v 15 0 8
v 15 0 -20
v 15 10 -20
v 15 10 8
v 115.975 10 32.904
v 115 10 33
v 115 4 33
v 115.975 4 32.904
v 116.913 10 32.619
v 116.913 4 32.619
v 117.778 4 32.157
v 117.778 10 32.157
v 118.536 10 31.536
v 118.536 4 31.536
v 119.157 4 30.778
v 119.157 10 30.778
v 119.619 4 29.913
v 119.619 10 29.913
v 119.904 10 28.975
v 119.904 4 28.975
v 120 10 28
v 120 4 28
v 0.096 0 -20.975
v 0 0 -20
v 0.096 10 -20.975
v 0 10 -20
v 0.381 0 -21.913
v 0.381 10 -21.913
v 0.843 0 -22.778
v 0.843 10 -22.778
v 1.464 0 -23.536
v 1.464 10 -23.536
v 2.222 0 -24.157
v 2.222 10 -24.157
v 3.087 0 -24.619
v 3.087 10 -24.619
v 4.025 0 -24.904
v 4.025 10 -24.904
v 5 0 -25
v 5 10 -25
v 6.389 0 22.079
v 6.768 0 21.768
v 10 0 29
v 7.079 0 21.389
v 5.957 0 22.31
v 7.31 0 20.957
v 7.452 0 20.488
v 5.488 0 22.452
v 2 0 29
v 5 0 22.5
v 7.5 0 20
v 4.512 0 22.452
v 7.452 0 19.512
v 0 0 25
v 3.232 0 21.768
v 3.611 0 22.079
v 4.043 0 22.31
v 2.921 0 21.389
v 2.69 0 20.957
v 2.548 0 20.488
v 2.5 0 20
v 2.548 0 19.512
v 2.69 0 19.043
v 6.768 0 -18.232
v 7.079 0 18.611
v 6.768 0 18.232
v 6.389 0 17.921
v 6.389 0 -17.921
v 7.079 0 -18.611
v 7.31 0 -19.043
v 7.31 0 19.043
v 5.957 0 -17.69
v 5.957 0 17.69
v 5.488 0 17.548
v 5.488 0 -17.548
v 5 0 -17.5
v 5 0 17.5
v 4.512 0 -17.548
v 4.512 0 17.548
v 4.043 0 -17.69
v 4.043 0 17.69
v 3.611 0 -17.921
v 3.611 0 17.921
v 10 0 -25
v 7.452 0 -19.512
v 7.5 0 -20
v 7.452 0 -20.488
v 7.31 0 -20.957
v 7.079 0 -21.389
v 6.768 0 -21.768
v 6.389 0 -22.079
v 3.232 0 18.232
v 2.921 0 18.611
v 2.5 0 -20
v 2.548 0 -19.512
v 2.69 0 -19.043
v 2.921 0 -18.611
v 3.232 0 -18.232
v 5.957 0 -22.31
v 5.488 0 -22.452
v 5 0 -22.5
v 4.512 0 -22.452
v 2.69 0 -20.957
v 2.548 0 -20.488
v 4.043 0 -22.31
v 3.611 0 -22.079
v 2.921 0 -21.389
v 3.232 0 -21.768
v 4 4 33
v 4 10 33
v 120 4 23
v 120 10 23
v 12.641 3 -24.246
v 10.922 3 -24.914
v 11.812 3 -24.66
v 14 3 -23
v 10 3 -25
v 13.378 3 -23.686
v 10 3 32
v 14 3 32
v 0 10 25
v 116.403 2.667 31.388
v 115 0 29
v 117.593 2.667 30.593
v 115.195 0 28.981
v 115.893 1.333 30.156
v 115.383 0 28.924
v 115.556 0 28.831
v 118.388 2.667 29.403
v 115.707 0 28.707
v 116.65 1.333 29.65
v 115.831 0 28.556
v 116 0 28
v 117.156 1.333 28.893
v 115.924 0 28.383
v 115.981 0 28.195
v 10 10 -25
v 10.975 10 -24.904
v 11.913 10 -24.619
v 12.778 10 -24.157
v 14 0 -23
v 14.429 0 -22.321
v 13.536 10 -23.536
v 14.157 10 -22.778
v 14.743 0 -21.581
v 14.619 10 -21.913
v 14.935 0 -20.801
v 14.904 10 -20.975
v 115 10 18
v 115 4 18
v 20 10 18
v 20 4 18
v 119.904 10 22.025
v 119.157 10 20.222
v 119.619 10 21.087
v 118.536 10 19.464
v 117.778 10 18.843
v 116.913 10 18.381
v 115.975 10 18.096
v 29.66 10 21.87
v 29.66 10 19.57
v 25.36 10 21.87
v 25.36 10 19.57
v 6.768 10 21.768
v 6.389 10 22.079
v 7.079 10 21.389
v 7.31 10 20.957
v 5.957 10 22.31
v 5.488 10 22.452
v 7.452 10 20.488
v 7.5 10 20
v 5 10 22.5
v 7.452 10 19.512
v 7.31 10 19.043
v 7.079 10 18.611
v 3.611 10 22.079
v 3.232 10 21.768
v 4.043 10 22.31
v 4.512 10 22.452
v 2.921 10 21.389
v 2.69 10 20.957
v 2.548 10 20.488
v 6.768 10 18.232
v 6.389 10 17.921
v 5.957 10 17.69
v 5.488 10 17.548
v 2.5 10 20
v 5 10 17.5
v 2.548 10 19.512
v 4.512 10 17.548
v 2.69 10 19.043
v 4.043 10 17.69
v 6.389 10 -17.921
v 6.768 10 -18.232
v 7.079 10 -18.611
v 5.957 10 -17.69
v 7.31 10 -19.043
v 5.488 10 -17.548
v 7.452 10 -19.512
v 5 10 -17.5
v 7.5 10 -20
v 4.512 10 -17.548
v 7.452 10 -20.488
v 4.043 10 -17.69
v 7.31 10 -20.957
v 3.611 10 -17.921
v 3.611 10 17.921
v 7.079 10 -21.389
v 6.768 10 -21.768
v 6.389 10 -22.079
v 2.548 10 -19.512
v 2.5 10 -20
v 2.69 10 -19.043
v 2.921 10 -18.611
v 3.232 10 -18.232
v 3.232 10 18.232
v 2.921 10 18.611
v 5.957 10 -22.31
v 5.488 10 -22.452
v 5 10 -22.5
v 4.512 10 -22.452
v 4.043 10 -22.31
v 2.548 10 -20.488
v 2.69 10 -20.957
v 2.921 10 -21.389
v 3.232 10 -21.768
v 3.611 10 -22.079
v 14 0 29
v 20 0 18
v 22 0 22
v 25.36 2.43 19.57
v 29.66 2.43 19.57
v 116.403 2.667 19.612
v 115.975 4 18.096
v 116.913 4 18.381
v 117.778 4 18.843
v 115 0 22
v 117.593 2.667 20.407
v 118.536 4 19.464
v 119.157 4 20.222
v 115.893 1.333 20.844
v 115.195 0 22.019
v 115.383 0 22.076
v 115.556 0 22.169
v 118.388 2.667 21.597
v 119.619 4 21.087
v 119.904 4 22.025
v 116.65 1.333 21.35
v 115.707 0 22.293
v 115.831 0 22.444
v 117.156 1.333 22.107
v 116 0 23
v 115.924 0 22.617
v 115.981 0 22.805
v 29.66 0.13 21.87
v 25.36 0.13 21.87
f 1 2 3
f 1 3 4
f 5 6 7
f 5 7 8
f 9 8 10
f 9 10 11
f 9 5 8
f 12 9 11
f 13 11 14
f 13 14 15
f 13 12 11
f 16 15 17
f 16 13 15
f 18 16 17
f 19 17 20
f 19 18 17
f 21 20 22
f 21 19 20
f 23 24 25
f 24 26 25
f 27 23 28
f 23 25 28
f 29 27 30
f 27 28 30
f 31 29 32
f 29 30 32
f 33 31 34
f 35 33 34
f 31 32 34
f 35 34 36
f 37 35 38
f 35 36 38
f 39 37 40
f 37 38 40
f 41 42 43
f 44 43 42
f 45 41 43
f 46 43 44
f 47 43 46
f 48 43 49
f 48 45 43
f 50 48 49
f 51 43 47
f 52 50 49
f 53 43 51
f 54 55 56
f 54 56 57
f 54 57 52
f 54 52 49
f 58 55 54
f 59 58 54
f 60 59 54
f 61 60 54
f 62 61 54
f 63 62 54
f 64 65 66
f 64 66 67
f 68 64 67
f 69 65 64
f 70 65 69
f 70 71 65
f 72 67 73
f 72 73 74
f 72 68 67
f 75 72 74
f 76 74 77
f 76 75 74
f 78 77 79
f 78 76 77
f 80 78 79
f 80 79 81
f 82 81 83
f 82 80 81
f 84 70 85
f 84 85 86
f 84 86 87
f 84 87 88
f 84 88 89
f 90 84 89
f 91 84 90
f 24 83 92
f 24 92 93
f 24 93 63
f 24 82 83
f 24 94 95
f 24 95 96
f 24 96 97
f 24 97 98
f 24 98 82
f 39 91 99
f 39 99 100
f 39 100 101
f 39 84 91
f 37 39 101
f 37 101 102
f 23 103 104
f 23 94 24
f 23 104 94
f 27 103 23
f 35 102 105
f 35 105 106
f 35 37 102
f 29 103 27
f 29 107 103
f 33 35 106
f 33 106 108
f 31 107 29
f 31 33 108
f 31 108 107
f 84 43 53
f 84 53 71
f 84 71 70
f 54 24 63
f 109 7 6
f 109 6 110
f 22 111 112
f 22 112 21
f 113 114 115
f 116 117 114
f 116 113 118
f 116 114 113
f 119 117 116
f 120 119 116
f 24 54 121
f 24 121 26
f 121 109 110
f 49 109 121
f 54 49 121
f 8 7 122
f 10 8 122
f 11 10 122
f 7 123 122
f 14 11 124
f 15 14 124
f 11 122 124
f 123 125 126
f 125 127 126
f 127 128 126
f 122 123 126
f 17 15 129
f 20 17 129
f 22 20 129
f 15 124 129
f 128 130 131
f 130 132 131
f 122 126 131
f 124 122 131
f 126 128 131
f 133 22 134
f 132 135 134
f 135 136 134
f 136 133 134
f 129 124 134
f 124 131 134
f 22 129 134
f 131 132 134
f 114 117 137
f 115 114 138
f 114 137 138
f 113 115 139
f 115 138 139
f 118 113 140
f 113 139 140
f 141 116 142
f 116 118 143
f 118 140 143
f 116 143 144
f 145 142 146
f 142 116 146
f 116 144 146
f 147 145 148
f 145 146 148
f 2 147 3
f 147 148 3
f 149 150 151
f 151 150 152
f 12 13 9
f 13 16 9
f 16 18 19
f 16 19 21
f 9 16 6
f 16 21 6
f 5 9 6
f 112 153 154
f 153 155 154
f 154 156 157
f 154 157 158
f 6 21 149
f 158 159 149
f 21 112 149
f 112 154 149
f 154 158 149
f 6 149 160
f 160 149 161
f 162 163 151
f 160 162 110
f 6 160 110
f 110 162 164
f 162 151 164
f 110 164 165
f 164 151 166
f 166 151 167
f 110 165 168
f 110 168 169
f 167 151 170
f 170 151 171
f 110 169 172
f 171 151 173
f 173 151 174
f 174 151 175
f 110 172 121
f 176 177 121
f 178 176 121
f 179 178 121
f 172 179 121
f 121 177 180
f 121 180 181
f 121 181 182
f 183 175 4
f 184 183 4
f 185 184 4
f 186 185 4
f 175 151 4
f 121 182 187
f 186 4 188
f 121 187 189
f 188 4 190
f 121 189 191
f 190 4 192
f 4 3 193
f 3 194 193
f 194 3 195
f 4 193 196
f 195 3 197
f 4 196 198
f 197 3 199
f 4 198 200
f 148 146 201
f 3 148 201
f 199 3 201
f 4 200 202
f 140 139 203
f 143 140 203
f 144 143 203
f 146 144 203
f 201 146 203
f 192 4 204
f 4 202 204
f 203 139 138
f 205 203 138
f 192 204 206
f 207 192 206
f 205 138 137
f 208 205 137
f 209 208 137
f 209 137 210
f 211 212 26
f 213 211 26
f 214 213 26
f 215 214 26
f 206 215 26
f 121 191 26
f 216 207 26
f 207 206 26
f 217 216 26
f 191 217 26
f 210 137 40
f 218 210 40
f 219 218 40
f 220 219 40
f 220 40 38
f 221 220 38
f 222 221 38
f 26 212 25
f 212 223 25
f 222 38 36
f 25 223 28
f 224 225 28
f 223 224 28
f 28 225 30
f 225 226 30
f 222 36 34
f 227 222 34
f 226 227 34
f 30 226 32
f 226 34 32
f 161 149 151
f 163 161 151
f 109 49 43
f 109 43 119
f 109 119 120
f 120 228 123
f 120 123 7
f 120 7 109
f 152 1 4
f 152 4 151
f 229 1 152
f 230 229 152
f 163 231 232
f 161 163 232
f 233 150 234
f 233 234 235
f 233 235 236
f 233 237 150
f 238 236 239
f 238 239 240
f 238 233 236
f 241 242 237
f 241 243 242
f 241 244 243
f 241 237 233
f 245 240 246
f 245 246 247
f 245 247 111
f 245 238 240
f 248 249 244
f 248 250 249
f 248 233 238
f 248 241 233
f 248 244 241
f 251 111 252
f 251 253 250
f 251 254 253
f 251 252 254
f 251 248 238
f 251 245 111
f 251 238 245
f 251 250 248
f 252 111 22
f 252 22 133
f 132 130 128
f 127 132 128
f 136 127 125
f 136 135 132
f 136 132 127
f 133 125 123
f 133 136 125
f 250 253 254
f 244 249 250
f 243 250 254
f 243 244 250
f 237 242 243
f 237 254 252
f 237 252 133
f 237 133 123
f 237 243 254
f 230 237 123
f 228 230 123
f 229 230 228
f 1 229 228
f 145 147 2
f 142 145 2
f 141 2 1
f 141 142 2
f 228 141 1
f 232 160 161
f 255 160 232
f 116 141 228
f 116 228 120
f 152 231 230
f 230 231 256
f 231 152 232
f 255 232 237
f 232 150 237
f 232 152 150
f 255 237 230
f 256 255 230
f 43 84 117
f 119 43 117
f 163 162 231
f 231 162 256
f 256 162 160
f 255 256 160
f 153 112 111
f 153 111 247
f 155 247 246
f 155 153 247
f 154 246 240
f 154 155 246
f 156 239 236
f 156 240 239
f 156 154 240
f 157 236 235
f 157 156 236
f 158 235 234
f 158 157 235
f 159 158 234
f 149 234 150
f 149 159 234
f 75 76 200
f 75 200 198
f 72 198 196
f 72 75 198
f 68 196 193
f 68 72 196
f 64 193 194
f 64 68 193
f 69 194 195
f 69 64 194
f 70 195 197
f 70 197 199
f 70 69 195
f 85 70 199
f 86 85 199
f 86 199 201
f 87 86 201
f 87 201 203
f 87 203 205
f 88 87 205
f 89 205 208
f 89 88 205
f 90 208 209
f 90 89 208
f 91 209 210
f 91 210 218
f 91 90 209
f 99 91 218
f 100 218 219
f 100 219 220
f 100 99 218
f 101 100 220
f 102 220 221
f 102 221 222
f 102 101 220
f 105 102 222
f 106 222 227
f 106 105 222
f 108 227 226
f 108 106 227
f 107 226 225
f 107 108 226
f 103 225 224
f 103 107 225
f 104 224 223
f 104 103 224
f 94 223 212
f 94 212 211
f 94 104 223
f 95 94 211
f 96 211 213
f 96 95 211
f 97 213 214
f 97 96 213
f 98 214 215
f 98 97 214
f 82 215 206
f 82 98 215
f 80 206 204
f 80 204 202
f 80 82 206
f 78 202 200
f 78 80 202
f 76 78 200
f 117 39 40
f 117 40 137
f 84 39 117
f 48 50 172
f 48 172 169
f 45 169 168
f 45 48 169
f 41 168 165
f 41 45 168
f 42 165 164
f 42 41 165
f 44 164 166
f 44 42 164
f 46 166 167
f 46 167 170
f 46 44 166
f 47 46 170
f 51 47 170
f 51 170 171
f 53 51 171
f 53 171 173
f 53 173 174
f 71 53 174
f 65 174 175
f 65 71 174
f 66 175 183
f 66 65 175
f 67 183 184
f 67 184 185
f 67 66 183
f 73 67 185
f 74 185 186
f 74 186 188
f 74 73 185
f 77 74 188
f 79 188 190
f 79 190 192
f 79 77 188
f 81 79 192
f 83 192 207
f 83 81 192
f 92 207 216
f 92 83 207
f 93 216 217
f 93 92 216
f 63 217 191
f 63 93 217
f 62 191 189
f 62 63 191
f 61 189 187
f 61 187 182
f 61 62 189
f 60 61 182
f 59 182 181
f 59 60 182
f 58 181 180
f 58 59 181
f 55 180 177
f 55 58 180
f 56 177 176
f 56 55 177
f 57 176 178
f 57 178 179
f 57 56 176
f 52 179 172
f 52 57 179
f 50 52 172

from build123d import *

# Parameters (mm, degrees)
SKETCH1_R           = 2.5
SKETCH1_W           = 4.3
SKETCH1_H           = 2.3
BOSS_EXTRUDE1_DEPTH = 10
SKETCH2_W           = 4
SKETCH2_H           = 59.39567842
CUT_EXTRUDE1_DEPTH  = 3
FILLET3_R           = 5
CHAMFER2_SIZE       = 4


with BuildPart() as part:
    # Sketch1 → Boss-Extrude1 (new body)
    with BuildSketch(Plane(origin=(0, 0, 0), x_dir=(1, 0, 0), z_dir=(0, 1, 0))):
        Polygon((0, -25), (0, 25), (15, 25), (15, -8), (20, -18), (32, -18), (35, -18), (120, -18), (120, -33), (4, -33), align=None)
        with Locations(Location((5, 20, 0), (0, 0, 270))):
            Circle(SKETCH1_R, mode=Mode.SUBTRACT)
        with Locations(Location((5, -20, 0), (0, 0, 270))):
            Circle(SKETCH1_R, mode=Mode.SUBTRACT)
        with Locations((27.51, -20.72)):
            Rectangle(SKETCH1_W, SKETCH1_H, mode=Mode.SUBTRACT)
    extrude(amount=BOSS_EXTRUDE1_DEPTH)

    # Sketch2 → Cut-Extrude1 (cut)
    with BuildSketch(Plane.XZ):
        with Locations((12, 4.69783921)):
            Rectangle(SKETCH2_W, SKETCH2_H)
    extrude(amount=-CUT_EXTRUDE1_DEPTH, mode=Mode.SUBTRACT)

    # Fillet3
    fillet3_edges = [part.edges().sort_by_distance(p)[0] for p in [
        (120, 5, 33),
        (120, 5, 18),
        (0, 5, -25),
        (15, 5, -25),
    ]]
    fillet(fillet3_edges, radius=FILLET3_R)

    # Chamfer2
    # the kernel refuses this chamfer: 4 mm, written as the material it takes off along each edge
    with BuildSketch(Plane(origin=(20.286731952, 0, 33), x_dir=(0, -0.027495876610586365, -0.9996219169112968), z_dir=(-1, 0, 0))) as chamfer2_piece_1:
        Polygon((CHAMFER2_SIZE * 0.999621916911, -CHAMFER2_SIZE * 0.0274958766106), (-CHAMFER2_SIZE * 0.0274958766106, -CHAMFER2_SIZE * 0.999621916911), (0, 0), align=None)
    extrude(amount=26.573463904, mode=Mode.SUBTRACT)
    with BuildSketch(Plane(origin=(115, 0, 33), x_dir=(0, 0.9996219169112968, 0.02749587661058563), z_dir=(-1, 0, 0))) as chamfer2_piece_2:
        Polygon((CHAMFER2_SIZE * 0.999621916911, CHAMFER2_SIZE * 0.0274958766106), (-CHAMFER2_SIZE * 0.0274958766106, CHAMFER2_SIZE * 0.999621916911), (0, 0), align=None)
    extrude(amount=111.286731952, mode=Mode.SUBTRACT)
    with BuildSketch(Plane(origin=(120, 0, 23), x_dir=(0.02749587661058563, 0.9996219169112968, 0), z_dir=(0, 0, 1))) as chamfer2_piece_3:
        Polygon((CHAMFER2_SIZE * 0.999621916911, CHAMFER2_SIZE * 0.0274958766106), (-CHAMFER2_SIZE * 0.0274958766106, CHAMFER2_SIZE * 0.999621916911), (0, 0), align=None)
    extrude(amount=5, mode=Mode.SUBTRACT)
    with BuildSketch(Plane(origin=(115, 0, 18), x_dir=(0, 0.999621916911297, -0.02749587661058045), z_dir=(-1, 0, 0))) as chamfer2_piece_4_section:
        Polygon((CHAMFER2_SIZE * 0.999621916911, -CHAMFER2_SIZE * 0.0274958766106), (-CHAMFER2_SIZE * 0.0274958766106, -CHAMFER2_SIZE * 0.999621916911), (0, 0), align=None)
    chamfer2_piece_4 = extrude(amount=105.286731952, mode=Mode.PRIVATE)
    chamfer2_piece_4 = split(chamfer2_piece_4, bisect_by=Plane(origin=(30.091205291, 1.322053336, 38.182410583), z_dir=(0.8944271909999159, 0, -0.4472135954999581)), keep=Keep.TOP, mode=Mode.PRIVATE)
    add(chamfer2_piece_4, mode=Mode.SUBTRACT)
    with BuildSketch(Plane(origin=(115, 0, 23), x_dir=(0, 0, -1), z_dir=(-1, 0, 0))) as chamfer2_piece_5:
        Polygon((5, -CHAMFER2_SIZE), (5 - CHAMFER2_SIZE, 0), (5, 0), align=None)
    revolve(axis=Axis((115, 0, 23), (0, -1, 0)), revolution_arc=90, mode=Mode.SUBTRACT)
    with BuildSketch(Plane(origin=(115, 0, 28), x_dir=(0, 0, 1), z_dir=(-1, 0, 0))) as chamfer2_piece_6:
        Polygon((5, CHAMFER2_SIZE), (5 - CHAMFER2_SIZE, 0), (5, 0), align=None)
    revolve(axis=Axis((115, 0, 28), (0, 1, 0)), revolution_arc=90, mode=Mode.SUBTRACT)


solid = part.part
